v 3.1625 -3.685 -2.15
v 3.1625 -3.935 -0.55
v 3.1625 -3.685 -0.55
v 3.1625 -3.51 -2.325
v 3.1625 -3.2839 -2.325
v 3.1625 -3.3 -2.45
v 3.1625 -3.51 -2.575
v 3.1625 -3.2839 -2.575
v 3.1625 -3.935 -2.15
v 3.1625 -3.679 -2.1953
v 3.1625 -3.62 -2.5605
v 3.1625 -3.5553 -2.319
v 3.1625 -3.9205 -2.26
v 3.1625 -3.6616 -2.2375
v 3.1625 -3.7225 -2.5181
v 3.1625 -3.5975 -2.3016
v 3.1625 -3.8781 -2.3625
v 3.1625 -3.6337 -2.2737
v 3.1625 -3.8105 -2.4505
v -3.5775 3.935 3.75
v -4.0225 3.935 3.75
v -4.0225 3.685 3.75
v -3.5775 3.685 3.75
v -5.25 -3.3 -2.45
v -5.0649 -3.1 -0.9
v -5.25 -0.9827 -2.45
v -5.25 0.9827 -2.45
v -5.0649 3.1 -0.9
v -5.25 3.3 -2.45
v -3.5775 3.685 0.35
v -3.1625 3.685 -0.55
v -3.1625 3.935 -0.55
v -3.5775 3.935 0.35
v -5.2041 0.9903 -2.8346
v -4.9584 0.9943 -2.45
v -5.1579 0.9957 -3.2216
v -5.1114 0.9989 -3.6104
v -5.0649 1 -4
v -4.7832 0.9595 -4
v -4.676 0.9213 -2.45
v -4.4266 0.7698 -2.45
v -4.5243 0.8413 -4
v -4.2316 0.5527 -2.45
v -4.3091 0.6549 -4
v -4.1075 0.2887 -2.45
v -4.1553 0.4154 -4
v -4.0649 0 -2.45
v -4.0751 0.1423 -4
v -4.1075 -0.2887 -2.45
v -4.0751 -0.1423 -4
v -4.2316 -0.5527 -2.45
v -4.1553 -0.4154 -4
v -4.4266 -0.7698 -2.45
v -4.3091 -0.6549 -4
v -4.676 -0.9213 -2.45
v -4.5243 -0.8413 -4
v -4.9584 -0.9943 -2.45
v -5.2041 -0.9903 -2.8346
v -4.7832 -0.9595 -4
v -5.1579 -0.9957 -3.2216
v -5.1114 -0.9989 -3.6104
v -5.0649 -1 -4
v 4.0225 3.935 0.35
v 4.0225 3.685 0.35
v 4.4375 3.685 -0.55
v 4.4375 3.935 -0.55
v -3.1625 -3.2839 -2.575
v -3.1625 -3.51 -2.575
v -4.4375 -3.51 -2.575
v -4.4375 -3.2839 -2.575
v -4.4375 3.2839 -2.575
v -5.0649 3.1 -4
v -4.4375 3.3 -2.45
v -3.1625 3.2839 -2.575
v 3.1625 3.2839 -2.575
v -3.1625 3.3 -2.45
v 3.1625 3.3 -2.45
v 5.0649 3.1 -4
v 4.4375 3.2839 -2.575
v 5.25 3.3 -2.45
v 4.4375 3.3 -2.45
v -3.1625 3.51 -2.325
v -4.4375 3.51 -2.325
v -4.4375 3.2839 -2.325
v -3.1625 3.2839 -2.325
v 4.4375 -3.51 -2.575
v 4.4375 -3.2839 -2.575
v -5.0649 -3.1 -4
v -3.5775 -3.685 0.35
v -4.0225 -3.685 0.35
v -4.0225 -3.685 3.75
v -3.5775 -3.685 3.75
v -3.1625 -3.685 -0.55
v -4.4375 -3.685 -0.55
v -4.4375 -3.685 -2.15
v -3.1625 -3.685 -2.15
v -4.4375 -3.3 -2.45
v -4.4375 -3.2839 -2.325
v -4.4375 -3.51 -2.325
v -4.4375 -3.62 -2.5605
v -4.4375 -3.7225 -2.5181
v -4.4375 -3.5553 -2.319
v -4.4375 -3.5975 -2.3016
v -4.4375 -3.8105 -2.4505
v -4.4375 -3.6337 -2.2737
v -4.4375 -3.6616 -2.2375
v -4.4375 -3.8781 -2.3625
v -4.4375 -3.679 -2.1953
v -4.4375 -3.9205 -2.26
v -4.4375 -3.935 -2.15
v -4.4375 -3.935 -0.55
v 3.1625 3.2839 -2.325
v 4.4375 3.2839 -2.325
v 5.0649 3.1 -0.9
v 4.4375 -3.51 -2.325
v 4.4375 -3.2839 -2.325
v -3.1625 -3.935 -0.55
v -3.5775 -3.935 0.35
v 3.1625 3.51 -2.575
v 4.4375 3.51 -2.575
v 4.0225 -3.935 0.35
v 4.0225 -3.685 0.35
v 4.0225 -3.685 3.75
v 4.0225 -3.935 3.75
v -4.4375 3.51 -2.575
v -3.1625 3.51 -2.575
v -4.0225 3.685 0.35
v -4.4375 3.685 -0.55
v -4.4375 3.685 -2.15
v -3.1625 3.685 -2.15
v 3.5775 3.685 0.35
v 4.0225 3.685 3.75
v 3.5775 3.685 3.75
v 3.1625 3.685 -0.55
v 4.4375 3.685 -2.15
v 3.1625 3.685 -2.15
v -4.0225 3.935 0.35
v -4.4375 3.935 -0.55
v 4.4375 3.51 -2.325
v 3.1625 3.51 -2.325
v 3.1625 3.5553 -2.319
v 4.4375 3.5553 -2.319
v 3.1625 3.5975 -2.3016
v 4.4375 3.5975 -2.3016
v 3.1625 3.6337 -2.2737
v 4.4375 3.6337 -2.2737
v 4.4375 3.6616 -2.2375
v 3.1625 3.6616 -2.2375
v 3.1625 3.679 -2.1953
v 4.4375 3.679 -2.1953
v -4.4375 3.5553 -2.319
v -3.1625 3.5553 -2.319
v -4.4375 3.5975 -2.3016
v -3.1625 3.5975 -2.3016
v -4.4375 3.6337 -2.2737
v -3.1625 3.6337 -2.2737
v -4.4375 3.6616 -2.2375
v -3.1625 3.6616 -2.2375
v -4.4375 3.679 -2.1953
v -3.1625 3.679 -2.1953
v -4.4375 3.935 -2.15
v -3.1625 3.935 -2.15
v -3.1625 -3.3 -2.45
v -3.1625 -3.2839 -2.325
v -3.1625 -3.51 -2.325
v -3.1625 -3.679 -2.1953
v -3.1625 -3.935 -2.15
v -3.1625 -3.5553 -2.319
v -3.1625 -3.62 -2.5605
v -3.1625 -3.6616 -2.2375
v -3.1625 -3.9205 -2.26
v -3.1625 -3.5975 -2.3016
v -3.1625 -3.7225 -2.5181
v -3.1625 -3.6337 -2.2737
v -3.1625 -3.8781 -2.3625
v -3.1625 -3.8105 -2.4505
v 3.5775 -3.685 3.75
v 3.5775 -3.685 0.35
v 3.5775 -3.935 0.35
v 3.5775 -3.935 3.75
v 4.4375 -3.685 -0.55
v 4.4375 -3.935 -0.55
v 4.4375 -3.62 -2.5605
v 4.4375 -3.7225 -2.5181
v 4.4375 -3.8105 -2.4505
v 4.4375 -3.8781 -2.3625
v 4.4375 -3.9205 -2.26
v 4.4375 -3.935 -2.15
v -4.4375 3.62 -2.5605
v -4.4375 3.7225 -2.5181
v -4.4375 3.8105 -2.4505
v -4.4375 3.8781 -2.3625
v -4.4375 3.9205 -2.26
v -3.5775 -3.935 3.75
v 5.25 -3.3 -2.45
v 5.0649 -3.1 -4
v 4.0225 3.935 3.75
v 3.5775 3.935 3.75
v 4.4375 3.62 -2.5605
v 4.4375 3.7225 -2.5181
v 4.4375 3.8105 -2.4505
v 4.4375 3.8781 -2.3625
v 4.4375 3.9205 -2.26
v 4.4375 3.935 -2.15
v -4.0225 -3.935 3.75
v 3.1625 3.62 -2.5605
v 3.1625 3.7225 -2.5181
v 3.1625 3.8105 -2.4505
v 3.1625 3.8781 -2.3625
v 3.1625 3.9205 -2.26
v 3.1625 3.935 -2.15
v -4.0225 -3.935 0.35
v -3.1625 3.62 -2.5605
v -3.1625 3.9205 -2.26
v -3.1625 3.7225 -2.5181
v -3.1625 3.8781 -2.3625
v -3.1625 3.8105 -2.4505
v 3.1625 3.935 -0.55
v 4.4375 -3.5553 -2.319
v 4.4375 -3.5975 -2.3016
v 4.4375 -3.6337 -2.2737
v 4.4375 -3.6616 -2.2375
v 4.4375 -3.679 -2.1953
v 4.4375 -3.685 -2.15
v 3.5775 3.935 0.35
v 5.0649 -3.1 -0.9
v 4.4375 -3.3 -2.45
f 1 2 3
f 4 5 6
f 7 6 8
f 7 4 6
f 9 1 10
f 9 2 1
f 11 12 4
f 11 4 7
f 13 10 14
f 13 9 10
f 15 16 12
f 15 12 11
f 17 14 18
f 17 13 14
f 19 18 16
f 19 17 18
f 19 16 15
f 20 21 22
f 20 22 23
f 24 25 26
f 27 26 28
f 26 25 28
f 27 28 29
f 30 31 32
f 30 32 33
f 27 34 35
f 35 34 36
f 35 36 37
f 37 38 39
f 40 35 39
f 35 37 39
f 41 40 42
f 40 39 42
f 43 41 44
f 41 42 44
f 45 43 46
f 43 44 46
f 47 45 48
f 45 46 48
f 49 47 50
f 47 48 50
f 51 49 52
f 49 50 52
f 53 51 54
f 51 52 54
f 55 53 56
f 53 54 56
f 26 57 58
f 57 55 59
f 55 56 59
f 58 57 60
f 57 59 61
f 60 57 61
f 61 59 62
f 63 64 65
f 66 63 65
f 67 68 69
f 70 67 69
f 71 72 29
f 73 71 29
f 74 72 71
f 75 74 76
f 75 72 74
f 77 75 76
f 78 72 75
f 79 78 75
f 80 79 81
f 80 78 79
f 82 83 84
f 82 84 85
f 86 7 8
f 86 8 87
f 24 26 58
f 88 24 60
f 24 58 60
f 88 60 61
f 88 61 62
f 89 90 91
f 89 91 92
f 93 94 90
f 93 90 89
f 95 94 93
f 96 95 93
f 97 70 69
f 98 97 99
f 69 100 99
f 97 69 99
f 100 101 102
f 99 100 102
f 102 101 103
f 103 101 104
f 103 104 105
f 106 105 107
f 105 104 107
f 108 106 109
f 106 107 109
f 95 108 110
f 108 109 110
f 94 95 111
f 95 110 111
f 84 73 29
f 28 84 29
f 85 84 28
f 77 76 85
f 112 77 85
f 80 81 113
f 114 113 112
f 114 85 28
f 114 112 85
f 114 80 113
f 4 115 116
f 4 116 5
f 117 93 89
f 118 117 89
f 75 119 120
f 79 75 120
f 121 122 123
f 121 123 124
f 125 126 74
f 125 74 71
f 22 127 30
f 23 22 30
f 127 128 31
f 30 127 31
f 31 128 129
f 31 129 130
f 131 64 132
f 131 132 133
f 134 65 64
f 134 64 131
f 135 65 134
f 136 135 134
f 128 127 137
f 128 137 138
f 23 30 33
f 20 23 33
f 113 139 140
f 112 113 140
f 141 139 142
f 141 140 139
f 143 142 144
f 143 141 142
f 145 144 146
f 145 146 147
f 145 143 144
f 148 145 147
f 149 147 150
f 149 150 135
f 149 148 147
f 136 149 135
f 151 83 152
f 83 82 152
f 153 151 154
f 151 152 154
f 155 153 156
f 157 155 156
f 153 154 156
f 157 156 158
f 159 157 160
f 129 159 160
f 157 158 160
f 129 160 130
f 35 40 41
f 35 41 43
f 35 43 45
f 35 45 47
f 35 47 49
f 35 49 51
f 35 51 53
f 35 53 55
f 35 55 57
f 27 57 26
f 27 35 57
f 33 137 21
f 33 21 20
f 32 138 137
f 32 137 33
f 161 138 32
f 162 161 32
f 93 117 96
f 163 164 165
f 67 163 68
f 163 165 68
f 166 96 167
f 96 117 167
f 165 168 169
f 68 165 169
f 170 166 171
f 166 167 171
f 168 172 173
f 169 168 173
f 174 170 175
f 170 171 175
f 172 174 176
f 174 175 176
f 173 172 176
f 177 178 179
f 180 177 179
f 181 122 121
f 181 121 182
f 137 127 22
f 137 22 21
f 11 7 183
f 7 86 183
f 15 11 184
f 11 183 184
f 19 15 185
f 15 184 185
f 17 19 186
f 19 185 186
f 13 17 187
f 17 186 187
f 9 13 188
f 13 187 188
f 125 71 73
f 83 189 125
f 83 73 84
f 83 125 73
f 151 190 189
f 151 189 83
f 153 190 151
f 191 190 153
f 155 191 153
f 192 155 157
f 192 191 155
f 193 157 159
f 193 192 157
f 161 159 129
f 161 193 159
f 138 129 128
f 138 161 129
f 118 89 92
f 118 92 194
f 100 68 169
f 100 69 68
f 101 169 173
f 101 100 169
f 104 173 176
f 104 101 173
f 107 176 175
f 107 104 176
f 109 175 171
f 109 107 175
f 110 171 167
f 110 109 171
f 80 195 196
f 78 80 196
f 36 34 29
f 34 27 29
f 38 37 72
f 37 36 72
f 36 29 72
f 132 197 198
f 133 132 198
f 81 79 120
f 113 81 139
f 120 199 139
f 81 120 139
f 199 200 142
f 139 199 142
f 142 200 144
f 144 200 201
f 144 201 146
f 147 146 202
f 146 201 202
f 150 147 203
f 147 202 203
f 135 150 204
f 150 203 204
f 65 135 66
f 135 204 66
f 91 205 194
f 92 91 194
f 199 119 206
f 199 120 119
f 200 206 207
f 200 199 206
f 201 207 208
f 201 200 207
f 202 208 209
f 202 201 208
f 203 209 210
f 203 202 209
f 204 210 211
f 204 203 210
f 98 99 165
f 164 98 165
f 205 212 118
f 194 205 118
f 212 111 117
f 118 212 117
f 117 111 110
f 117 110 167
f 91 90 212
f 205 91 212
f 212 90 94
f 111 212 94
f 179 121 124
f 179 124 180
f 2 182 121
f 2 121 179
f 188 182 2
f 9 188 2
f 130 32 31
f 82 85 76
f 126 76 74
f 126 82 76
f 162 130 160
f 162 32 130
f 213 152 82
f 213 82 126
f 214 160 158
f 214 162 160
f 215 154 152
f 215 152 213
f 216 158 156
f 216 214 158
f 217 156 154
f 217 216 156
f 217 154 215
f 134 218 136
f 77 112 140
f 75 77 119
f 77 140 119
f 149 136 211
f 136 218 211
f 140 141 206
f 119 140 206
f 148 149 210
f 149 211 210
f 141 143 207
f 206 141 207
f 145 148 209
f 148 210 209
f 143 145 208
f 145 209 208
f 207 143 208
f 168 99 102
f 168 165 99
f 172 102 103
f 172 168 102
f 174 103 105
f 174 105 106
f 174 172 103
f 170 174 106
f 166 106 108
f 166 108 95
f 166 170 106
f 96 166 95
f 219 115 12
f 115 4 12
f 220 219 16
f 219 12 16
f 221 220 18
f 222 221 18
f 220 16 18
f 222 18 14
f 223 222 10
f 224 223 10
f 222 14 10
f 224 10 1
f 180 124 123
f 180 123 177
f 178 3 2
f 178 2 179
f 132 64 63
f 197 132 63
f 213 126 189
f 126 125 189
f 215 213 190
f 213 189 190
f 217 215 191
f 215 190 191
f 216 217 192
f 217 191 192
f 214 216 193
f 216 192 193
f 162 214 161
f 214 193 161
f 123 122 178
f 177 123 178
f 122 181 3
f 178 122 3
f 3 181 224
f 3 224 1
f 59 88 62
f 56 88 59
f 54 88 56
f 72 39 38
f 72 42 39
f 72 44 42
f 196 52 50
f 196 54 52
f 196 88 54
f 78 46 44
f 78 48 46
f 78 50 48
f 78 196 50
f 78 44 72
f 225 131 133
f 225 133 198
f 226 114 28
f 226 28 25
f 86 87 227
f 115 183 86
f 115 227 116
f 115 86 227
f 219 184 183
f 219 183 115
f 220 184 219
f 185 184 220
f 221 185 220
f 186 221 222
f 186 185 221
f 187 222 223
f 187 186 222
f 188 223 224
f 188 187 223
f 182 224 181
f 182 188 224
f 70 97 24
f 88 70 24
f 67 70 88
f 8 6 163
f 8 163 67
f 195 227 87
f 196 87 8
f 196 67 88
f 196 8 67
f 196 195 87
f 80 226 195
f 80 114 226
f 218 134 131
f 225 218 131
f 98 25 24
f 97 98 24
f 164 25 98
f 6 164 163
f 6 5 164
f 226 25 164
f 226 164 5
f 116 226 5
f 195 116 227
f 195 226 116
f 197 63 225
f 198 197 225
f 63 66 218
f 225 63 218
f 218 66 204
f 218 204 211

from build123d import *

# Parameters (mm, degrees)
RESSALTO_EXTRUS_O1_DEPTH  = 5.25
CORTE_EXTRUS_O2_DEPTH     = 3.55
ESBO_O8_R                 = 1
CORTE_EXTRUS_O5_DEPTH     = 1.55
ESBO_O6_W                 = 1.275
ESBO_O6_H                 = 0.25
RESSALTO_EXTRUS_O2_DEPTH  = 0.025
ESBO_O7_W                 = 1.275
ESBO_O7_H                 = 0.25
CORTE_EXTRUS_O6_START     = -0.25
CORTE_EXTRUS_O6_DEPTH     = 0.25
ESBO_O10_W                = 0.445
ESBO_O10_H                = 0.25
RESSALTO_EXTRUS_O3_DEPTH  = 3.4
SIMETR_A1_COPY_1_SKETCH_W = 1.275
SIMETR_A1_COPY_1_SKETCH_H = 0.25
SIMETR_A1_COPY_1_DEPTH    = 0.025
SIMETR_A1_COPY_2_SKETCH_W = 1.275
SIMETR_A1_COPY_2_SKETCH_H = 0.25
SIMETR_A1_START           = -0.25
SIMETR_A1_COPY_3_DEPTH    = 0.25
SIMETR_A1_COPY_4_SKETCH_W = 0.445
SIMETR_A1_COPY_4_SKETCH_H = 0.25
SIMETR_A1_COPY_4_DEPTH    = 3.4


with BuildPart() as part:
    # Esboço1 → Ressalto-extrusão1 (new, symmetric)
    with BuildSketch(Plane(origin=(0, 0, 0), x_dir=(0, 0, -1), z_dir=(1, 0, 0))):
        Polygon((0.9, 3.1), (0.9, -3.1), (2.45, -3.3), (4, -3.1), (4, 3.1), (2.45, 3.3), align=None)
    extrude(amount=RESSALTO_EXTRUS_O1_DEPTH, both=True)

    # Esboço3 → Corte-extrusão2 (cut, symmetric)
    with BuildSketch(Plane(origin=(0, 0, 0), x_dir=(1, 0, 0), z_dir=(0, 1, 0))):
        Polygon((-5.25, 2.45), (-5.019897634, 4.376835982), (-6.186348907, 4.376835982), (-6.186348907, 0.523164018), (-5.019897634, 0.523164018), align=None)
    corte_extrus_o2 = extrude(amount=CORTE_EXTRUS_O2_DEPTH, both=True, mode=Mode.SUBTRACT)

    # Espelhar1: Corte-extrusão2 across plane
    add(corte_extrus_o2.mirror(Plane(origin=(0, 0, 0), x_dir=(0, 0, 1), z_dir=(1, 0, 0))), mode=Mode.SUBTRACT)

    # Esboço8 → Corte-extrusão5 (cut)
    with BuildSketch(Plane(origin=(0, 0, -4), x_dir=(-1, 0, 0), z_dir=(0, 0, -1))):
        with Locations((5.064899312, 0)):
            Circle(ESBO_O8_R)
    extrude(amount=-CORTE_EXTRUS_O5_DEPTH, mode=Mode.SUBTRACT)

    # Esboço6 → Ressalto-extrusão2 (add, symmetric)
    with BuildSketch(Plane(origin=(0, 3.3, 0), x_dir=(1, 0, 0), z_dir=(0, 1, 0))):
        with Locations((-3.8, 2.45)):
            Rectangle(ESBO_O6_W, ESBO_O6_H)
    ressalto_extrus_o2 = extrude(amount=RESSALTO_EXTRUS_O2_DEPTH, both=True)

    # Varredura1: sweep along a curve in space
    with BuildLine() as varredura1_path:
        Line((-3.8, 3.325, -2.45), (-3.8, 3.51, -2.45))
        ThreePointArc((-3.8, 3.51, -2.45), (-3.8, 3.722132034, -2.362132034), (-3.8, 3.81, -2.15))
        Line((-3.8, 3.81, -2.15), (-3.8, 3.81, 0.35))
    # Esboço7 → Varredura1 (sweep)
    with BuildSketch(Plane(origin=(0, 3.325, 0), x_dir=(1, 0, 0), z_dir=(0, 1, 0))):
        with Locations((-3.8, 2.45)):
            Rectangle(ESBO_O7_W, ESBO_O7_H)
    varredura1 = sweep(path=varredura1_path.line)

    # Esboço9 → Corte-extrusão6 (cut)
    with BuildSketch(Plane(origin=(0, 3.935, 0), x_dir=(1, 0, 0), z_dir=(0, 1, 0)).offset(CORTE_EXTRUS_O6_START)):
        Polygon((-4.0225, -0.35), (-4.4375, 0.55), (-4.4375, -0.55), (-3.1625, -0.55), (-3.1625, 0.55), (-3.5775, -0.35), align=None)
    corte_extrus_o6 = extrude(amount=CORTE_EXTRUS_O6_DEPTH, mode=Mode.SUBTRACT)

    # Esboço10 → Ressalto-extrusão3 (add)
    with BuildSketch(Plane.XY.offset(0.35)):
        with Locations((-3.8, 3.81)):
            Rectangle(ESBO_O10_W, ESBO_O10_H)
    ressalto_extrus_o3 = extrude(amount=RESSALTO_EXTRUS_O3_DEPTH)

    # Espelhar2: Ressalto-extrusão2, Varredura1, Corte-extrusão6, Ressalto-extrusão3 across plane
    add(ressalto_extrus_o2.mirror(Plane.ZX))
    add(varredura1.mirror(Plane.ZX))
    add(corte_extrus_o6.mirror(Plane.ZX), mode=Mode.SUBTRACT)
    add(ressalto_extrus_o3.mirror(Plane.ZX))

    # Simetría1: Ressalto-extrusão2, Varredura1, Corte-extrusão6, Ressalto-extrusão3 across plane
    add(ressalto_extrus_o2.mirror(Plane(origin=(0, 0, 0), x_dir=(0, 0, 1), z_dir=(1, 0, 0))))
    add(varredura1.mirror(Plane(origin=(0, 0, 0), x_dir=(0, 0, 1), z_dir=(1, 0, 0))))
    add(corte_extrus_o6.mirror(Plane(origin=(0, 0, 0), x_dir=(0, 0, 1), z_dir=(1, 0, 0))), mode=Mode.SUBTRACT)
    add(ressalto_extrus_o3.mirror(Plane(origin=(0, 0, 0), x_dir=(0, 0, 1), z_dir=(1, 0, 0))))

    # Simetría1 copy 1 sketch → Simetría1 copy 1 (add, symmetric)
    with BuildSketch(Plane(origin=(0, -3.3, 0), x_dir=(-1, 0, 0), z_dir=(0, -1, 0))):
        with Locations((-3.8, 2.45)):
            Rectangle(SIMETR_A1_COPY_1_SKETCH_W, SIMETR_A1_COPY_1_SKETCH_H)
    extrude(amount=SIMETR_A1_COPY_1_DEPTH, both=True)

    # Simetría1 copy 2: sweep along a curve in space
    with BuildLine() as simetr_a1_copy_2_path:
        Line((3.8, -3.325, -2.45), (3.8, -3.51, -2.45))
        ThreePointArc((3.8, -3.51, -2.45), (3.8, -3.722132034, -2.362132034), (3.8, -3.81, -2.15))
        Line((3.8, -3.81, -2.15), (3.8, -3.81, 0.35))
    # Simetría1 copy 2 sketch → Simetría1 copy 2 (sweep)
    with BuildSketch(Plane(origin=(0, -3.325, 0), x_dir=(-1, 0, 0), z_dir=(0, -1, 0))):
        with Locations((-3.8, 2.45)):
            Rectangle(SIMETR_A1_COPY_2_SKETCH_W, SIMETR_A1_COPY_2_SKETCH_H)
    sweep(path=simetr_a1_copy_2_path.line)

    # Simetría1 copy 3 sketch → Simetría1 copy 3 (cut)
    with BuildSketch(Plane(origin=(0, -3.935, 0), x_dir=(-1, 0, 0), z_dir=(0, -1, 0)).offset(SIMETR_A1_START)):
        Polygon((-4.0225, -0.35), (-4.4375, 0.55), (-4.4375, -0.55), (-3.1625, -0.55), (-3.1625, 0.55), (-3.5775, -0.35), align=None)
    extrude(amount=SIMETR_A1_COPY_3_DEPTH, mode=Mode.SUBTRACT)

    # Simetría1 copy 4 sketch → Simetría1 copy 4 (add)
    with BuildSketch(Plane(origin=(0, 0, 0.35), x_dir=(-1, 0, 0), z_dir=(0, 0, 1))):
        with Locations((-3.8, 3.81)):
            Rectangle(SIMETR_A1_COPY_4_SKETCH_W, SIMETR_A1_COPY_4_SKETCH_H)
    extrude(amount=SIMETR_A1_COPY_4_DEPTH)


solid = part.part
